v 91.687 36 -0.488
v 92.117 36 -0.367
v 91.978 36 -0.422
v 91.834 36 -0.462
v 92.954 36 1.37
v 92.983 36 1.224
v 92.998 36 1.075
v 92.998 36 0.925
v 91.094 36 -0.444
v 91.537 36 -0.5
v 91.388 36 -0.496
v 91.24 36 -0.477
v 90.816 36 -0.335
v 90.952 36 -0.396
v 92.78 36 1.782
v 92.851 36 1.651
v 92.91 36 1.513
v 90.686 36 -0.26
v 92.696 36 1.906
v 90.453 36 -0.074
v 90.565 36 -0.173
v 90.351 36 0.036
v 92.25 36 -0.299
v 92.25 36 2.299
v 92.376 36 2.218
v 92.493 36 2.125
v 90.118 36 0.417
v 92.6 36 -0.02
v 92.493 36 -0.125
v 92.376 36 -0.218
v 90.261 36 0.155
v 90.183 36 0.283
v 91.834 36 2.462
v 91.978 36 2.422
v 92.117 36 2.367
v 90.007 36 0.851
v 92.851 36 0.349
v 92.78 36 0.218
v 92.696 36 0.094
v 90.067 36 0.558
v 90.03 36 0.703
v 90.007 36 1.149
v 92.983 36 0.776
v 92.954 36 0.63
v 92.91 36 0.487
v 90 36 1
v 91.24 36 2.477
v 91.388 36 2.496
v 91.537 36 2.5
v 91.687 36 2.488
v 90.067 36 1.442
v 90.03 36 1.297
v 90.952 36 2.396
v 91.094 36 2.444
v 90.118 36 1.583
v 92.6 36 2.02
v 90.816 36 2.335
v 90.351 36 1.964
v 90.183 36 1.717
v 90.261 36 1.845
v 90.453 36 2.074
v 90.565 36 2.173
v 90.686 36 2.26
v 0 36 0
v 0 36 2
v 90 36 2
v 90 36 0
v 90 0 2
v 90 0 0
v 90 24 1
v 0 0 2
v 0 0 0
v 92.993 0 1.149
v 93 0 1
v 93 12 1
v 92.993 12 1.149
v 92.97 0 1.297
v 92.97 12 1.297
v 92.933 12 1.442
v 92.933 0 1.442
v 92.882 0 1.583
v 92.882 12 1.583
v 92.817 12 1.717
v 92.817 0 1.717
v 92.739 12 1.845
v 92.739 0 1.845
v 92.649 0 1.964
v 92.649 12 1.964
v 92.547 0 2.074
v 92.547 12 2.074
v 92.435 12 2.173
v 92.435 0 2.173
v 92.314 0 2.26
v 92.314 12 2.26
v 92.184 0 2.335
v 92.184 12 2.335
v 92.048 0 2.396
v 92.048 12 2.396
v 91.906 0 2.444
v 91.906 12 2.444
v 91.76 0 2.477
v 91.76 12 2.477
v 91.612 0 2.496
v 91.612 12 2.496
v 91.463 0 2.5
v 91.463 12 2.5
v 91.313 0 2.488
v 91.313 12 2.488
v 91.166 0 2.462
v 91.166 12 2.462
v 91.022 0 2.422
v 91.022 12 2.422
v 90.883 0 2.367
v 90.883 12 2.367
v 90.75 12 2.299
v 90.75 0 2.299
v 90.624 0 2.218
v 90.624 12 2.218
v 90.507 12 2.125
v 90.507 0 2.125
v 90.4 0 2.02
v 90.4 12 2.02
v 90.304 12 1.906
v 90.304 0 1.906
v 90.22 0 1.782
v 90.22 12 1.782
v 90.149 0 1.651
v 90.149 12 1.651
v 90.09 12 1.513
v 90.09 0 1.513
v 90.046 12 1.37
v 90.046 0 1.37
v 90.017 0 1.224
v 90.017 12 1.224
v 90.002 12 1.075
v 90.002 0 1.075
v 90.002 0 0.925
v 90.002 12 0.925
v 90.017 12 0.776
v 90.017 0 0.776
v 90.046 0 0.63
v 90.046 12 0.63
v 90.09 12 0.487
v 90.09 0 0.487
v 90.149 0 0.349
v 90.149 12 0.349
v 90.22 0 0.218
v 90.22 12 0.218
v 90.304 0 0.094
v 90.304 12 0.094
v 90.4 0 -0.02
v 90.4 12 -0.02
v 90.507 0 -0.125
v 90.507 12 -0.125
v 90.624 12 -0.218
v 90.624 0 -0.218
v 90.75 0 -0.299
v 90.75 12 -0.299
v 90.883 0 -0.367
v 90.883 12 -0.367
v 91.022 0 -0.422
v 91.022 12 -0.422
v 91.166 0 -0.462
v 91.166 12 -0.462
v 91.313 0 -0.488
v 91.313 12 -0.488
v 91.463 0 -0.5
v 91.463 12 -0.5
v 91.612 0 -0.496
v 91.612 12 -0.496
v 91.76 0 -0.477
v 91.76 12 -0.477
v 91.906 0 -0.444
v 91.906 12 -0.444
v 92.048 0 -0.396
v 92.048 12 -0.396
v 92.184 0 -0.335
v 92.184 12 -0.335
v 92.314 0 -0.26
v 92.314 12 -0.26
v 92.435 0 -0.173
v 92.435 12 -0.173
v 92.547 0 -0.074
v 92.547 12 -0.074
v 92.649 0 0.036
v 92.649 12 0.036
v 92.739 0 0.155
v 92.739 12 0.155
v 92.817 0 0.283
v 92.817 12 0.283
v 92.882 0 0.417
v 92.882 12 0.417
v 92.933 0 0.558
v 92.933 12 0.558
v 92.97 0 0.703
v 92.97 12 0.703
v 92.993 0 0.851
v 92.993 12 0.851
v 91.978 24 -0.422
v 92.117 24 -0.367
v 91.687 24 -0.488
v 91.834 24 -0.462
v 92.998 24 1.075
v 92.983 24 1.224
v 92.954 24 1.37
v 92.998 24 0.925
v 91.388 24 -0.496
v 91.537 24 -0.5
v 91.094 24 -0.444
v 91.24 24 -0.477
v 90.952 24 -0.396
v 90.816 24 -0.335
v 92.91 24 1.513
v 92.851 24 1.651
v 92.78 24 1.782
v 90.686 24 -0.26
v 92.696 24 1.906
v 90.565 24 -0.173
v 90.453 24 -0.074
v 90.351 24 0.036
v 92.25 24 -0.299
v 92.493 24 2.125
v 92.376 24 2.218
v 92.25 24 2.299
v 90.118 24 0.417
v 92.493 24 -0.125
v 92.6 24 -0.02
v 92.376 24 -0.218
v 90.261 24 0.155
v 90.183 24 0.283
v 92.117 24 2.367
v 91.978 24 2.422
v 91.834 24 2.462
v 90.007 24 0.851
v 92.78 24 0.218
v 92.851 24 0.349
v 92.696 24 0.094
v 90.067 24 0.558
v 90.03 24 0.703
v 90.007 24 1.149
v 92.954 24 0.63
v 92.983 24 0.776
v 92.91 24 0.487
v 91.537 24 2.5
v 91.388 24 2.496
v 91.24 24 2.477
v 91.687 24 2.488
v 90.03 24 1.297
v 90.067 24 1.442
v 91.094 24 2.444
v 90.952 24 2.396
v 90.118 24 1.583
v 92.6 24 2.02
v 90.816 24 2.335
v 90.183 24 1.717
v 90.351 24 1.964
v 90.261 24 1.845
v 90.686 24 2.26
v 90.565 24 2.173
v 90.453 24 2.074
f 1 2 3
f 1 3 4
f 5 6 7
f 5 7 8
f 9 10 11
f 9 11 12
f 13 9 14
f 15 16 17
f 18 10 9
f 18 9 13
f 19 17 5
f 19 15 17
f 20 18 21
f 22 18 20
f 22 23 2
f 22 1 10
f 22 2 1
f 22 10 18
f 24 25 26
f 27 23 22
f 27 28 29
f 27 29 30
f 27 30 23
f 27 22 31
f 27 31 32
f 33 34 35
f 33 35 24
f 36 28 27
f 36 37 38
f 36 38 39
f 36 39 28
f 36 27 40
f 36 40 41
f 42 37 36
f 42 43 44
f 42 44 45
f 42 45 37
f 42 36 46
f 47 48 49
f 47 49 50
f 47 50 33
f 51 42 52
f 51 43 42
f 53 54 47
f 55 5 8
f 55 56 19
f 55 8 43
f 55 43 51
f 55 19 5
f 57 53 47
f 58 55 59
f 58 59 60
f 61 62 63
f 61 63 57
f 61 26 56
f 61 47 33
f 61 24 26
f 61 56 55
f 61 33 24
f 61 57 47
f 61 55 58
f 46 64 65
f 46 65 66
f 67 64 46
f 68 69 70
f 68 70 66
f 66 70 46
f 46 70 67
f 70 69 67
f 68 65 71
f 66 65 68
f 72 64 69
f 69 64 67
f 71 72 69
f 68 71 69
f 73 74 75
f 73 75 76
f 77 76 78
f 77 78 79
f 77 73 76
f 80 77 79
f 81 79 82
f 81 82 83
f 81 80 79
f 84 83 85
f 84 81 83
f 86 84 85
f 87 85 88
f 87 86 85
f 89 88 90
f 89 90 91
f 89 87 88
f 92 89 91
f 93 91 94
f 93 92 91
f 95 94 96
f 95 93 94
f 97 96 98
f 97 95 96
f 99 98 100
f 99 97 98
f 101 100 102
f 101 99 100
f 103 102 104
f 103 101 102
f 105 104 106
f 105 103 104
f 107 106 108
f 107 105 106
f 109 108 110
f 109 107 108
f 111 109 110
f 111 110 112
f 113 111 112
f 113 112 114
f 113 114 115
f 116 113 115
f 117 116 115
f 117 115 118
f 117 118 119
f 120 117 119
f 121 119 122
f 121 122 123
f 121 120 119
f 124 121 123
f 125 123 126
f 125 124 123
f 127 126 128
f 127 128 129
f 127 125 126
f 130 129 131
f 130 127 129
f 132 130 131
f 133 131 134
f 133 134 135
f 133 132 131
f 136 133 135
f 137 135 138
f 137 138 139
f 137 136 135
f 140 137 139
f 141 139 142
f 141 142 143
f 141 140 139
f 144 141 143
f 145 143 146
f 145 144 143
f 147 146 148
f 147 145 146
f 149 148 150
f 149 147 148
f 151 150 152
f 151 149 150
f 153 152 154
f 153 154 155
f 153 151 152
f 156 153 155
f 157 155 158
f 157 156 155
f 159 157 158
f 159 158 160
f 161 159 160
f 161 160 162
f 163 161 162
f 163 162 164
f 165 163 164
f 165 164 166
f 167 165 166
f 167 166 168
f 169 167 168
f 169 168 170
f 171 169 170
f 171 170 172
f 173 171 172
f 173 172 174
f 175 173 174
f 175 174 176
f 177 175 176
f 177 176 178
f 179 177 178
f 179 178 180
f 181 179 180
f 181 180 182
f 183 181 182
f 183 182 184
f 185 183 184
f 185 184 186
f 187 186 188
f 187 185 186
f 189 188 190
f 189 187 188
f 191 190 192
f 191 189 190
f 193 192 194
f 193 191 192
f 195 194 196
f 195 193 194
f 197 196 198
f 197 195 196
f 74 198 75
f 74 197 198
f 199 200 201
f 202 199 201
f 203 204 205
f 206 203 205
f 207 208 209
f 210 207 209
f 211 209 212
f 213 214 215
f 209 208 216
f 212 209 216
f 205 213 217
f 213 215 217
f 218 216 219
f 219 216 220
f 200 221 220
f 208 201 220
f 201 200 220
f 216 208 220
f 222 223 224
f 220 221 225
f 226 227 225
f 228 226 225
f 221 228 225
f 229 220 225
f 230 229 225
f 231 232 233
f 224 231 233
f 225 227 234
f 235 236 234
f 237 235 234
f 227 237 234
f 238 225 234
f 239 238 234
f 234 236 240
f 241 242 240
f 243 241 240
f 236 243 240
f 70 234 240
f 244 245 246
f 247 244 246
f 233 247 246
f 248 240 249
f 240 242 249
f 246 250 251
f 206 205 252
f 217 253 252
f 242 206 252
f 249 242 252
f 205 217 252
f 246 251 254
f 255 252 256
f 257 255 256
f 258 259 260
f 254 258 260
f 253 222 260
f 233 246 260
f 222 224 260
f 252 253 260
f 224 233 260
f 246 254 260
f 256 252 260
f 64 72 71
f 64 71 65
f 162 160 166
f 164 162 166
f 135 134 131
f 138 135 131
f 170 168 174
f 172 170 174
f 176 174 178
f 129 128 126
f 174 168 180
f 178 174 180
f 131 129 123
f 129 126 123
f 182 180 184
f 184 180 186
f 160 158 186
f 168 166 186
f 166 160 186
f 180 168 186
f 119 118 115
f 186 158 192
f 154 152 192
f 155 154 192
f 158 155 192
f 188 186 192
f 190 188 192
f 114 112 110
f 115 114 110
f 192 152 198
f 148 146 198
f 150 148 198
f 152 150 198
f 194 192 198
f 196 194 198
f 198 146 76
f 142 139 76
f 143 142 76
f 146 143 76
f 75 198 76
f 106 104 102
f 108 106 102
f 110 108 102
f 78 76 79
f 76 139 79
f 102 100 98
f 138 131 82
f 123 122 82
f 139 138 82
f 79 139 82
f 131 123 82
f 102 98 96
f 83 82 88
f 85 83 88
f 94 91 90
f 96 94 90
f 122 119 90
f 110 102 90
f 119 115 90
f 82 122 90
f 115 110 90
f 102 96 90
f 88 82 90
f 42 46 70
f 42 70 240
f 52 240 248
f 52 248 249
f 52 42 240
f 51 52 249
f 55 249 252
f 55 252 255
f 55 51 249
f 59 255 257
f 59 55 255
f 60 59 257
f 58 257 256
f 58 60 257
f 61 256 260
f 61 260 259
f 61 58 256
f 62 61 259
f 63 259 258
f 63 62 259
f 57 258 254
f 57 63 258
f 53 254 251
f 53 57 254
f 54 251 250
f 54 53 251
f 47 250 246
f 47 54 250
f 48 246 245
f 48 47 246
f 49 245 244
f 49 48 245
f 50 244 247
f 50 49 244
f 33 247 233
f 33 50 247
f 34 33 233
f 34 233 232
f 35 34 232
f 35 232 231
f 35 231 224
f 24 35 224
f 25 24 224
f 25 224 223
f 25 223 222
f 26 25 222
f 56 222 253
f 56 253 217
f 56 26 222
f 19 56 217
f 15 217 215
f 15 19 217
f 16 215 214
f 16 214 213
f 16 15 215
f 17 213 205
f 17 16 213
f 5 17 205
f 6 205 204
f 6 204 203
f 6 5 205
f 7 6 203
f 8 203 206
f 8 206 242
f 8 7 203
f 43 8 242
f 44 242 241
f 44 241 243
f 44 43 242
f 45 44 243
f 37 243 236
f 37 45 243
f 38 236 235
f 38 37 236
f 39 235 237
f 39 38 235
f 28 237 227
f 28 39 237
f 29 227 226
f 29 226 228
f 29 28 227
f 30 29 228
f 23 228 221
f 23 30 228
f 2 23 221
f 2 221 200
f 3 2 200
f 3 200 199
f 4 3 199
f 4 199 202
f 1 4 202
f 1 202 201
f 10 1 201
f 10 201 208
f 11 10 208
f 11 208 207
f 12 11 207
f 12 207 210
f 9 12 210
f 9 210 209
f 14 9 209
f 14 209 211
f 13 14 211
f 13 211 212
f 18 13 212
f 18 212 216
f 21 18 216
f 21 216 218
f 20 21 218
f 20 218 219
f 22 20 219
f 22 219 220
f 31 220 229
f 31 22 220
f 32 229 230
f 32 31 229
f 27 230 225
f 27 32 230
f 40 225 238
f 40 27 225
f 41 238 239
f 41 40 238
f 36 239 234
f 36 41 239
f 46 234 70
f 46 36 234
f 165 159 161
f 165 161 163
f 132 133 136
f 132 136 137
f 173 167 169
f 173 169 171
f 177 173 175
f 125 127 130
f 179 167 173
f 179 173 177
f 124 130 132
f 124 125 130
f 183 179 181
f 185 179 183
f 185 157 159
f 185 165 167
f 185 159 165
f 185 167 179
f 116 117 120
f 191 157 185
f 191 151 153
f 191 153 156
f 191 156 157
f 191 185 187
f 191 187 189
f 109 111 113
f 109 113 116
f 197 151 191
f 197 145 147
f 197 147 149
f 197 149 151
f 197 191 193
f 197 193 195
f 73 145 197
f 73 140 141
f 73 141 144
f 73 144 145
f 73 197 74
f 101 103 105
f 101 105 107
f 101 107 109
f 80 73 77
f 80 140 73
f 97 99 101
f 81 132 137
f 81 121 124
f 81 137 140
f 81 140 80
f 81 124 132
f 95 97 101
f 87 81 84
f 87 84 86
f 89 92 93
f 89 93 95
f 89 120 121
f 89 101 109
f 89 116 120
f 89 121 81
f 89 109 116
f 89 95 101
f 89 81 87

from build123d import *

# Parameters (mm, degrees)
F0_W     = 90
F0_H     = 36
F1_DEPTH = 2
F2_R     = 1.5
F3_DEPTH = 12
F4_R     = 1.5
F5_DEPTH = 12


with BuildPart() as f1:
    # F0 (on Top) → F1 (new body)
    with BuildSketch(Plane.XY):
        with Locations((45, 18)):
            Rectangle(F0_W, F0_H)
    extrude(amount=F1_DEPTH)

    # F4 (on face) → F5 (join)
    with BuildSketch(Plane(origin=(0, 36, 0), x_dir=(-1, 0, 0), z_dir=(0, 1, 0))):
        with Locations((-91.5, 1)):
            Circle(F4_R)
    extrude(amount=-F5_DEPTH)


with BuildPart() as f3:
    # F2 (on Front) → F3 (new body)
    with BuildSketch(Plane.XZ):
        with Locations((91.5, 1)):
            Circle(F2_R)
    extrude(amount=-F3_DEPTH)


solid = Compound([f1.part, f3.part])
